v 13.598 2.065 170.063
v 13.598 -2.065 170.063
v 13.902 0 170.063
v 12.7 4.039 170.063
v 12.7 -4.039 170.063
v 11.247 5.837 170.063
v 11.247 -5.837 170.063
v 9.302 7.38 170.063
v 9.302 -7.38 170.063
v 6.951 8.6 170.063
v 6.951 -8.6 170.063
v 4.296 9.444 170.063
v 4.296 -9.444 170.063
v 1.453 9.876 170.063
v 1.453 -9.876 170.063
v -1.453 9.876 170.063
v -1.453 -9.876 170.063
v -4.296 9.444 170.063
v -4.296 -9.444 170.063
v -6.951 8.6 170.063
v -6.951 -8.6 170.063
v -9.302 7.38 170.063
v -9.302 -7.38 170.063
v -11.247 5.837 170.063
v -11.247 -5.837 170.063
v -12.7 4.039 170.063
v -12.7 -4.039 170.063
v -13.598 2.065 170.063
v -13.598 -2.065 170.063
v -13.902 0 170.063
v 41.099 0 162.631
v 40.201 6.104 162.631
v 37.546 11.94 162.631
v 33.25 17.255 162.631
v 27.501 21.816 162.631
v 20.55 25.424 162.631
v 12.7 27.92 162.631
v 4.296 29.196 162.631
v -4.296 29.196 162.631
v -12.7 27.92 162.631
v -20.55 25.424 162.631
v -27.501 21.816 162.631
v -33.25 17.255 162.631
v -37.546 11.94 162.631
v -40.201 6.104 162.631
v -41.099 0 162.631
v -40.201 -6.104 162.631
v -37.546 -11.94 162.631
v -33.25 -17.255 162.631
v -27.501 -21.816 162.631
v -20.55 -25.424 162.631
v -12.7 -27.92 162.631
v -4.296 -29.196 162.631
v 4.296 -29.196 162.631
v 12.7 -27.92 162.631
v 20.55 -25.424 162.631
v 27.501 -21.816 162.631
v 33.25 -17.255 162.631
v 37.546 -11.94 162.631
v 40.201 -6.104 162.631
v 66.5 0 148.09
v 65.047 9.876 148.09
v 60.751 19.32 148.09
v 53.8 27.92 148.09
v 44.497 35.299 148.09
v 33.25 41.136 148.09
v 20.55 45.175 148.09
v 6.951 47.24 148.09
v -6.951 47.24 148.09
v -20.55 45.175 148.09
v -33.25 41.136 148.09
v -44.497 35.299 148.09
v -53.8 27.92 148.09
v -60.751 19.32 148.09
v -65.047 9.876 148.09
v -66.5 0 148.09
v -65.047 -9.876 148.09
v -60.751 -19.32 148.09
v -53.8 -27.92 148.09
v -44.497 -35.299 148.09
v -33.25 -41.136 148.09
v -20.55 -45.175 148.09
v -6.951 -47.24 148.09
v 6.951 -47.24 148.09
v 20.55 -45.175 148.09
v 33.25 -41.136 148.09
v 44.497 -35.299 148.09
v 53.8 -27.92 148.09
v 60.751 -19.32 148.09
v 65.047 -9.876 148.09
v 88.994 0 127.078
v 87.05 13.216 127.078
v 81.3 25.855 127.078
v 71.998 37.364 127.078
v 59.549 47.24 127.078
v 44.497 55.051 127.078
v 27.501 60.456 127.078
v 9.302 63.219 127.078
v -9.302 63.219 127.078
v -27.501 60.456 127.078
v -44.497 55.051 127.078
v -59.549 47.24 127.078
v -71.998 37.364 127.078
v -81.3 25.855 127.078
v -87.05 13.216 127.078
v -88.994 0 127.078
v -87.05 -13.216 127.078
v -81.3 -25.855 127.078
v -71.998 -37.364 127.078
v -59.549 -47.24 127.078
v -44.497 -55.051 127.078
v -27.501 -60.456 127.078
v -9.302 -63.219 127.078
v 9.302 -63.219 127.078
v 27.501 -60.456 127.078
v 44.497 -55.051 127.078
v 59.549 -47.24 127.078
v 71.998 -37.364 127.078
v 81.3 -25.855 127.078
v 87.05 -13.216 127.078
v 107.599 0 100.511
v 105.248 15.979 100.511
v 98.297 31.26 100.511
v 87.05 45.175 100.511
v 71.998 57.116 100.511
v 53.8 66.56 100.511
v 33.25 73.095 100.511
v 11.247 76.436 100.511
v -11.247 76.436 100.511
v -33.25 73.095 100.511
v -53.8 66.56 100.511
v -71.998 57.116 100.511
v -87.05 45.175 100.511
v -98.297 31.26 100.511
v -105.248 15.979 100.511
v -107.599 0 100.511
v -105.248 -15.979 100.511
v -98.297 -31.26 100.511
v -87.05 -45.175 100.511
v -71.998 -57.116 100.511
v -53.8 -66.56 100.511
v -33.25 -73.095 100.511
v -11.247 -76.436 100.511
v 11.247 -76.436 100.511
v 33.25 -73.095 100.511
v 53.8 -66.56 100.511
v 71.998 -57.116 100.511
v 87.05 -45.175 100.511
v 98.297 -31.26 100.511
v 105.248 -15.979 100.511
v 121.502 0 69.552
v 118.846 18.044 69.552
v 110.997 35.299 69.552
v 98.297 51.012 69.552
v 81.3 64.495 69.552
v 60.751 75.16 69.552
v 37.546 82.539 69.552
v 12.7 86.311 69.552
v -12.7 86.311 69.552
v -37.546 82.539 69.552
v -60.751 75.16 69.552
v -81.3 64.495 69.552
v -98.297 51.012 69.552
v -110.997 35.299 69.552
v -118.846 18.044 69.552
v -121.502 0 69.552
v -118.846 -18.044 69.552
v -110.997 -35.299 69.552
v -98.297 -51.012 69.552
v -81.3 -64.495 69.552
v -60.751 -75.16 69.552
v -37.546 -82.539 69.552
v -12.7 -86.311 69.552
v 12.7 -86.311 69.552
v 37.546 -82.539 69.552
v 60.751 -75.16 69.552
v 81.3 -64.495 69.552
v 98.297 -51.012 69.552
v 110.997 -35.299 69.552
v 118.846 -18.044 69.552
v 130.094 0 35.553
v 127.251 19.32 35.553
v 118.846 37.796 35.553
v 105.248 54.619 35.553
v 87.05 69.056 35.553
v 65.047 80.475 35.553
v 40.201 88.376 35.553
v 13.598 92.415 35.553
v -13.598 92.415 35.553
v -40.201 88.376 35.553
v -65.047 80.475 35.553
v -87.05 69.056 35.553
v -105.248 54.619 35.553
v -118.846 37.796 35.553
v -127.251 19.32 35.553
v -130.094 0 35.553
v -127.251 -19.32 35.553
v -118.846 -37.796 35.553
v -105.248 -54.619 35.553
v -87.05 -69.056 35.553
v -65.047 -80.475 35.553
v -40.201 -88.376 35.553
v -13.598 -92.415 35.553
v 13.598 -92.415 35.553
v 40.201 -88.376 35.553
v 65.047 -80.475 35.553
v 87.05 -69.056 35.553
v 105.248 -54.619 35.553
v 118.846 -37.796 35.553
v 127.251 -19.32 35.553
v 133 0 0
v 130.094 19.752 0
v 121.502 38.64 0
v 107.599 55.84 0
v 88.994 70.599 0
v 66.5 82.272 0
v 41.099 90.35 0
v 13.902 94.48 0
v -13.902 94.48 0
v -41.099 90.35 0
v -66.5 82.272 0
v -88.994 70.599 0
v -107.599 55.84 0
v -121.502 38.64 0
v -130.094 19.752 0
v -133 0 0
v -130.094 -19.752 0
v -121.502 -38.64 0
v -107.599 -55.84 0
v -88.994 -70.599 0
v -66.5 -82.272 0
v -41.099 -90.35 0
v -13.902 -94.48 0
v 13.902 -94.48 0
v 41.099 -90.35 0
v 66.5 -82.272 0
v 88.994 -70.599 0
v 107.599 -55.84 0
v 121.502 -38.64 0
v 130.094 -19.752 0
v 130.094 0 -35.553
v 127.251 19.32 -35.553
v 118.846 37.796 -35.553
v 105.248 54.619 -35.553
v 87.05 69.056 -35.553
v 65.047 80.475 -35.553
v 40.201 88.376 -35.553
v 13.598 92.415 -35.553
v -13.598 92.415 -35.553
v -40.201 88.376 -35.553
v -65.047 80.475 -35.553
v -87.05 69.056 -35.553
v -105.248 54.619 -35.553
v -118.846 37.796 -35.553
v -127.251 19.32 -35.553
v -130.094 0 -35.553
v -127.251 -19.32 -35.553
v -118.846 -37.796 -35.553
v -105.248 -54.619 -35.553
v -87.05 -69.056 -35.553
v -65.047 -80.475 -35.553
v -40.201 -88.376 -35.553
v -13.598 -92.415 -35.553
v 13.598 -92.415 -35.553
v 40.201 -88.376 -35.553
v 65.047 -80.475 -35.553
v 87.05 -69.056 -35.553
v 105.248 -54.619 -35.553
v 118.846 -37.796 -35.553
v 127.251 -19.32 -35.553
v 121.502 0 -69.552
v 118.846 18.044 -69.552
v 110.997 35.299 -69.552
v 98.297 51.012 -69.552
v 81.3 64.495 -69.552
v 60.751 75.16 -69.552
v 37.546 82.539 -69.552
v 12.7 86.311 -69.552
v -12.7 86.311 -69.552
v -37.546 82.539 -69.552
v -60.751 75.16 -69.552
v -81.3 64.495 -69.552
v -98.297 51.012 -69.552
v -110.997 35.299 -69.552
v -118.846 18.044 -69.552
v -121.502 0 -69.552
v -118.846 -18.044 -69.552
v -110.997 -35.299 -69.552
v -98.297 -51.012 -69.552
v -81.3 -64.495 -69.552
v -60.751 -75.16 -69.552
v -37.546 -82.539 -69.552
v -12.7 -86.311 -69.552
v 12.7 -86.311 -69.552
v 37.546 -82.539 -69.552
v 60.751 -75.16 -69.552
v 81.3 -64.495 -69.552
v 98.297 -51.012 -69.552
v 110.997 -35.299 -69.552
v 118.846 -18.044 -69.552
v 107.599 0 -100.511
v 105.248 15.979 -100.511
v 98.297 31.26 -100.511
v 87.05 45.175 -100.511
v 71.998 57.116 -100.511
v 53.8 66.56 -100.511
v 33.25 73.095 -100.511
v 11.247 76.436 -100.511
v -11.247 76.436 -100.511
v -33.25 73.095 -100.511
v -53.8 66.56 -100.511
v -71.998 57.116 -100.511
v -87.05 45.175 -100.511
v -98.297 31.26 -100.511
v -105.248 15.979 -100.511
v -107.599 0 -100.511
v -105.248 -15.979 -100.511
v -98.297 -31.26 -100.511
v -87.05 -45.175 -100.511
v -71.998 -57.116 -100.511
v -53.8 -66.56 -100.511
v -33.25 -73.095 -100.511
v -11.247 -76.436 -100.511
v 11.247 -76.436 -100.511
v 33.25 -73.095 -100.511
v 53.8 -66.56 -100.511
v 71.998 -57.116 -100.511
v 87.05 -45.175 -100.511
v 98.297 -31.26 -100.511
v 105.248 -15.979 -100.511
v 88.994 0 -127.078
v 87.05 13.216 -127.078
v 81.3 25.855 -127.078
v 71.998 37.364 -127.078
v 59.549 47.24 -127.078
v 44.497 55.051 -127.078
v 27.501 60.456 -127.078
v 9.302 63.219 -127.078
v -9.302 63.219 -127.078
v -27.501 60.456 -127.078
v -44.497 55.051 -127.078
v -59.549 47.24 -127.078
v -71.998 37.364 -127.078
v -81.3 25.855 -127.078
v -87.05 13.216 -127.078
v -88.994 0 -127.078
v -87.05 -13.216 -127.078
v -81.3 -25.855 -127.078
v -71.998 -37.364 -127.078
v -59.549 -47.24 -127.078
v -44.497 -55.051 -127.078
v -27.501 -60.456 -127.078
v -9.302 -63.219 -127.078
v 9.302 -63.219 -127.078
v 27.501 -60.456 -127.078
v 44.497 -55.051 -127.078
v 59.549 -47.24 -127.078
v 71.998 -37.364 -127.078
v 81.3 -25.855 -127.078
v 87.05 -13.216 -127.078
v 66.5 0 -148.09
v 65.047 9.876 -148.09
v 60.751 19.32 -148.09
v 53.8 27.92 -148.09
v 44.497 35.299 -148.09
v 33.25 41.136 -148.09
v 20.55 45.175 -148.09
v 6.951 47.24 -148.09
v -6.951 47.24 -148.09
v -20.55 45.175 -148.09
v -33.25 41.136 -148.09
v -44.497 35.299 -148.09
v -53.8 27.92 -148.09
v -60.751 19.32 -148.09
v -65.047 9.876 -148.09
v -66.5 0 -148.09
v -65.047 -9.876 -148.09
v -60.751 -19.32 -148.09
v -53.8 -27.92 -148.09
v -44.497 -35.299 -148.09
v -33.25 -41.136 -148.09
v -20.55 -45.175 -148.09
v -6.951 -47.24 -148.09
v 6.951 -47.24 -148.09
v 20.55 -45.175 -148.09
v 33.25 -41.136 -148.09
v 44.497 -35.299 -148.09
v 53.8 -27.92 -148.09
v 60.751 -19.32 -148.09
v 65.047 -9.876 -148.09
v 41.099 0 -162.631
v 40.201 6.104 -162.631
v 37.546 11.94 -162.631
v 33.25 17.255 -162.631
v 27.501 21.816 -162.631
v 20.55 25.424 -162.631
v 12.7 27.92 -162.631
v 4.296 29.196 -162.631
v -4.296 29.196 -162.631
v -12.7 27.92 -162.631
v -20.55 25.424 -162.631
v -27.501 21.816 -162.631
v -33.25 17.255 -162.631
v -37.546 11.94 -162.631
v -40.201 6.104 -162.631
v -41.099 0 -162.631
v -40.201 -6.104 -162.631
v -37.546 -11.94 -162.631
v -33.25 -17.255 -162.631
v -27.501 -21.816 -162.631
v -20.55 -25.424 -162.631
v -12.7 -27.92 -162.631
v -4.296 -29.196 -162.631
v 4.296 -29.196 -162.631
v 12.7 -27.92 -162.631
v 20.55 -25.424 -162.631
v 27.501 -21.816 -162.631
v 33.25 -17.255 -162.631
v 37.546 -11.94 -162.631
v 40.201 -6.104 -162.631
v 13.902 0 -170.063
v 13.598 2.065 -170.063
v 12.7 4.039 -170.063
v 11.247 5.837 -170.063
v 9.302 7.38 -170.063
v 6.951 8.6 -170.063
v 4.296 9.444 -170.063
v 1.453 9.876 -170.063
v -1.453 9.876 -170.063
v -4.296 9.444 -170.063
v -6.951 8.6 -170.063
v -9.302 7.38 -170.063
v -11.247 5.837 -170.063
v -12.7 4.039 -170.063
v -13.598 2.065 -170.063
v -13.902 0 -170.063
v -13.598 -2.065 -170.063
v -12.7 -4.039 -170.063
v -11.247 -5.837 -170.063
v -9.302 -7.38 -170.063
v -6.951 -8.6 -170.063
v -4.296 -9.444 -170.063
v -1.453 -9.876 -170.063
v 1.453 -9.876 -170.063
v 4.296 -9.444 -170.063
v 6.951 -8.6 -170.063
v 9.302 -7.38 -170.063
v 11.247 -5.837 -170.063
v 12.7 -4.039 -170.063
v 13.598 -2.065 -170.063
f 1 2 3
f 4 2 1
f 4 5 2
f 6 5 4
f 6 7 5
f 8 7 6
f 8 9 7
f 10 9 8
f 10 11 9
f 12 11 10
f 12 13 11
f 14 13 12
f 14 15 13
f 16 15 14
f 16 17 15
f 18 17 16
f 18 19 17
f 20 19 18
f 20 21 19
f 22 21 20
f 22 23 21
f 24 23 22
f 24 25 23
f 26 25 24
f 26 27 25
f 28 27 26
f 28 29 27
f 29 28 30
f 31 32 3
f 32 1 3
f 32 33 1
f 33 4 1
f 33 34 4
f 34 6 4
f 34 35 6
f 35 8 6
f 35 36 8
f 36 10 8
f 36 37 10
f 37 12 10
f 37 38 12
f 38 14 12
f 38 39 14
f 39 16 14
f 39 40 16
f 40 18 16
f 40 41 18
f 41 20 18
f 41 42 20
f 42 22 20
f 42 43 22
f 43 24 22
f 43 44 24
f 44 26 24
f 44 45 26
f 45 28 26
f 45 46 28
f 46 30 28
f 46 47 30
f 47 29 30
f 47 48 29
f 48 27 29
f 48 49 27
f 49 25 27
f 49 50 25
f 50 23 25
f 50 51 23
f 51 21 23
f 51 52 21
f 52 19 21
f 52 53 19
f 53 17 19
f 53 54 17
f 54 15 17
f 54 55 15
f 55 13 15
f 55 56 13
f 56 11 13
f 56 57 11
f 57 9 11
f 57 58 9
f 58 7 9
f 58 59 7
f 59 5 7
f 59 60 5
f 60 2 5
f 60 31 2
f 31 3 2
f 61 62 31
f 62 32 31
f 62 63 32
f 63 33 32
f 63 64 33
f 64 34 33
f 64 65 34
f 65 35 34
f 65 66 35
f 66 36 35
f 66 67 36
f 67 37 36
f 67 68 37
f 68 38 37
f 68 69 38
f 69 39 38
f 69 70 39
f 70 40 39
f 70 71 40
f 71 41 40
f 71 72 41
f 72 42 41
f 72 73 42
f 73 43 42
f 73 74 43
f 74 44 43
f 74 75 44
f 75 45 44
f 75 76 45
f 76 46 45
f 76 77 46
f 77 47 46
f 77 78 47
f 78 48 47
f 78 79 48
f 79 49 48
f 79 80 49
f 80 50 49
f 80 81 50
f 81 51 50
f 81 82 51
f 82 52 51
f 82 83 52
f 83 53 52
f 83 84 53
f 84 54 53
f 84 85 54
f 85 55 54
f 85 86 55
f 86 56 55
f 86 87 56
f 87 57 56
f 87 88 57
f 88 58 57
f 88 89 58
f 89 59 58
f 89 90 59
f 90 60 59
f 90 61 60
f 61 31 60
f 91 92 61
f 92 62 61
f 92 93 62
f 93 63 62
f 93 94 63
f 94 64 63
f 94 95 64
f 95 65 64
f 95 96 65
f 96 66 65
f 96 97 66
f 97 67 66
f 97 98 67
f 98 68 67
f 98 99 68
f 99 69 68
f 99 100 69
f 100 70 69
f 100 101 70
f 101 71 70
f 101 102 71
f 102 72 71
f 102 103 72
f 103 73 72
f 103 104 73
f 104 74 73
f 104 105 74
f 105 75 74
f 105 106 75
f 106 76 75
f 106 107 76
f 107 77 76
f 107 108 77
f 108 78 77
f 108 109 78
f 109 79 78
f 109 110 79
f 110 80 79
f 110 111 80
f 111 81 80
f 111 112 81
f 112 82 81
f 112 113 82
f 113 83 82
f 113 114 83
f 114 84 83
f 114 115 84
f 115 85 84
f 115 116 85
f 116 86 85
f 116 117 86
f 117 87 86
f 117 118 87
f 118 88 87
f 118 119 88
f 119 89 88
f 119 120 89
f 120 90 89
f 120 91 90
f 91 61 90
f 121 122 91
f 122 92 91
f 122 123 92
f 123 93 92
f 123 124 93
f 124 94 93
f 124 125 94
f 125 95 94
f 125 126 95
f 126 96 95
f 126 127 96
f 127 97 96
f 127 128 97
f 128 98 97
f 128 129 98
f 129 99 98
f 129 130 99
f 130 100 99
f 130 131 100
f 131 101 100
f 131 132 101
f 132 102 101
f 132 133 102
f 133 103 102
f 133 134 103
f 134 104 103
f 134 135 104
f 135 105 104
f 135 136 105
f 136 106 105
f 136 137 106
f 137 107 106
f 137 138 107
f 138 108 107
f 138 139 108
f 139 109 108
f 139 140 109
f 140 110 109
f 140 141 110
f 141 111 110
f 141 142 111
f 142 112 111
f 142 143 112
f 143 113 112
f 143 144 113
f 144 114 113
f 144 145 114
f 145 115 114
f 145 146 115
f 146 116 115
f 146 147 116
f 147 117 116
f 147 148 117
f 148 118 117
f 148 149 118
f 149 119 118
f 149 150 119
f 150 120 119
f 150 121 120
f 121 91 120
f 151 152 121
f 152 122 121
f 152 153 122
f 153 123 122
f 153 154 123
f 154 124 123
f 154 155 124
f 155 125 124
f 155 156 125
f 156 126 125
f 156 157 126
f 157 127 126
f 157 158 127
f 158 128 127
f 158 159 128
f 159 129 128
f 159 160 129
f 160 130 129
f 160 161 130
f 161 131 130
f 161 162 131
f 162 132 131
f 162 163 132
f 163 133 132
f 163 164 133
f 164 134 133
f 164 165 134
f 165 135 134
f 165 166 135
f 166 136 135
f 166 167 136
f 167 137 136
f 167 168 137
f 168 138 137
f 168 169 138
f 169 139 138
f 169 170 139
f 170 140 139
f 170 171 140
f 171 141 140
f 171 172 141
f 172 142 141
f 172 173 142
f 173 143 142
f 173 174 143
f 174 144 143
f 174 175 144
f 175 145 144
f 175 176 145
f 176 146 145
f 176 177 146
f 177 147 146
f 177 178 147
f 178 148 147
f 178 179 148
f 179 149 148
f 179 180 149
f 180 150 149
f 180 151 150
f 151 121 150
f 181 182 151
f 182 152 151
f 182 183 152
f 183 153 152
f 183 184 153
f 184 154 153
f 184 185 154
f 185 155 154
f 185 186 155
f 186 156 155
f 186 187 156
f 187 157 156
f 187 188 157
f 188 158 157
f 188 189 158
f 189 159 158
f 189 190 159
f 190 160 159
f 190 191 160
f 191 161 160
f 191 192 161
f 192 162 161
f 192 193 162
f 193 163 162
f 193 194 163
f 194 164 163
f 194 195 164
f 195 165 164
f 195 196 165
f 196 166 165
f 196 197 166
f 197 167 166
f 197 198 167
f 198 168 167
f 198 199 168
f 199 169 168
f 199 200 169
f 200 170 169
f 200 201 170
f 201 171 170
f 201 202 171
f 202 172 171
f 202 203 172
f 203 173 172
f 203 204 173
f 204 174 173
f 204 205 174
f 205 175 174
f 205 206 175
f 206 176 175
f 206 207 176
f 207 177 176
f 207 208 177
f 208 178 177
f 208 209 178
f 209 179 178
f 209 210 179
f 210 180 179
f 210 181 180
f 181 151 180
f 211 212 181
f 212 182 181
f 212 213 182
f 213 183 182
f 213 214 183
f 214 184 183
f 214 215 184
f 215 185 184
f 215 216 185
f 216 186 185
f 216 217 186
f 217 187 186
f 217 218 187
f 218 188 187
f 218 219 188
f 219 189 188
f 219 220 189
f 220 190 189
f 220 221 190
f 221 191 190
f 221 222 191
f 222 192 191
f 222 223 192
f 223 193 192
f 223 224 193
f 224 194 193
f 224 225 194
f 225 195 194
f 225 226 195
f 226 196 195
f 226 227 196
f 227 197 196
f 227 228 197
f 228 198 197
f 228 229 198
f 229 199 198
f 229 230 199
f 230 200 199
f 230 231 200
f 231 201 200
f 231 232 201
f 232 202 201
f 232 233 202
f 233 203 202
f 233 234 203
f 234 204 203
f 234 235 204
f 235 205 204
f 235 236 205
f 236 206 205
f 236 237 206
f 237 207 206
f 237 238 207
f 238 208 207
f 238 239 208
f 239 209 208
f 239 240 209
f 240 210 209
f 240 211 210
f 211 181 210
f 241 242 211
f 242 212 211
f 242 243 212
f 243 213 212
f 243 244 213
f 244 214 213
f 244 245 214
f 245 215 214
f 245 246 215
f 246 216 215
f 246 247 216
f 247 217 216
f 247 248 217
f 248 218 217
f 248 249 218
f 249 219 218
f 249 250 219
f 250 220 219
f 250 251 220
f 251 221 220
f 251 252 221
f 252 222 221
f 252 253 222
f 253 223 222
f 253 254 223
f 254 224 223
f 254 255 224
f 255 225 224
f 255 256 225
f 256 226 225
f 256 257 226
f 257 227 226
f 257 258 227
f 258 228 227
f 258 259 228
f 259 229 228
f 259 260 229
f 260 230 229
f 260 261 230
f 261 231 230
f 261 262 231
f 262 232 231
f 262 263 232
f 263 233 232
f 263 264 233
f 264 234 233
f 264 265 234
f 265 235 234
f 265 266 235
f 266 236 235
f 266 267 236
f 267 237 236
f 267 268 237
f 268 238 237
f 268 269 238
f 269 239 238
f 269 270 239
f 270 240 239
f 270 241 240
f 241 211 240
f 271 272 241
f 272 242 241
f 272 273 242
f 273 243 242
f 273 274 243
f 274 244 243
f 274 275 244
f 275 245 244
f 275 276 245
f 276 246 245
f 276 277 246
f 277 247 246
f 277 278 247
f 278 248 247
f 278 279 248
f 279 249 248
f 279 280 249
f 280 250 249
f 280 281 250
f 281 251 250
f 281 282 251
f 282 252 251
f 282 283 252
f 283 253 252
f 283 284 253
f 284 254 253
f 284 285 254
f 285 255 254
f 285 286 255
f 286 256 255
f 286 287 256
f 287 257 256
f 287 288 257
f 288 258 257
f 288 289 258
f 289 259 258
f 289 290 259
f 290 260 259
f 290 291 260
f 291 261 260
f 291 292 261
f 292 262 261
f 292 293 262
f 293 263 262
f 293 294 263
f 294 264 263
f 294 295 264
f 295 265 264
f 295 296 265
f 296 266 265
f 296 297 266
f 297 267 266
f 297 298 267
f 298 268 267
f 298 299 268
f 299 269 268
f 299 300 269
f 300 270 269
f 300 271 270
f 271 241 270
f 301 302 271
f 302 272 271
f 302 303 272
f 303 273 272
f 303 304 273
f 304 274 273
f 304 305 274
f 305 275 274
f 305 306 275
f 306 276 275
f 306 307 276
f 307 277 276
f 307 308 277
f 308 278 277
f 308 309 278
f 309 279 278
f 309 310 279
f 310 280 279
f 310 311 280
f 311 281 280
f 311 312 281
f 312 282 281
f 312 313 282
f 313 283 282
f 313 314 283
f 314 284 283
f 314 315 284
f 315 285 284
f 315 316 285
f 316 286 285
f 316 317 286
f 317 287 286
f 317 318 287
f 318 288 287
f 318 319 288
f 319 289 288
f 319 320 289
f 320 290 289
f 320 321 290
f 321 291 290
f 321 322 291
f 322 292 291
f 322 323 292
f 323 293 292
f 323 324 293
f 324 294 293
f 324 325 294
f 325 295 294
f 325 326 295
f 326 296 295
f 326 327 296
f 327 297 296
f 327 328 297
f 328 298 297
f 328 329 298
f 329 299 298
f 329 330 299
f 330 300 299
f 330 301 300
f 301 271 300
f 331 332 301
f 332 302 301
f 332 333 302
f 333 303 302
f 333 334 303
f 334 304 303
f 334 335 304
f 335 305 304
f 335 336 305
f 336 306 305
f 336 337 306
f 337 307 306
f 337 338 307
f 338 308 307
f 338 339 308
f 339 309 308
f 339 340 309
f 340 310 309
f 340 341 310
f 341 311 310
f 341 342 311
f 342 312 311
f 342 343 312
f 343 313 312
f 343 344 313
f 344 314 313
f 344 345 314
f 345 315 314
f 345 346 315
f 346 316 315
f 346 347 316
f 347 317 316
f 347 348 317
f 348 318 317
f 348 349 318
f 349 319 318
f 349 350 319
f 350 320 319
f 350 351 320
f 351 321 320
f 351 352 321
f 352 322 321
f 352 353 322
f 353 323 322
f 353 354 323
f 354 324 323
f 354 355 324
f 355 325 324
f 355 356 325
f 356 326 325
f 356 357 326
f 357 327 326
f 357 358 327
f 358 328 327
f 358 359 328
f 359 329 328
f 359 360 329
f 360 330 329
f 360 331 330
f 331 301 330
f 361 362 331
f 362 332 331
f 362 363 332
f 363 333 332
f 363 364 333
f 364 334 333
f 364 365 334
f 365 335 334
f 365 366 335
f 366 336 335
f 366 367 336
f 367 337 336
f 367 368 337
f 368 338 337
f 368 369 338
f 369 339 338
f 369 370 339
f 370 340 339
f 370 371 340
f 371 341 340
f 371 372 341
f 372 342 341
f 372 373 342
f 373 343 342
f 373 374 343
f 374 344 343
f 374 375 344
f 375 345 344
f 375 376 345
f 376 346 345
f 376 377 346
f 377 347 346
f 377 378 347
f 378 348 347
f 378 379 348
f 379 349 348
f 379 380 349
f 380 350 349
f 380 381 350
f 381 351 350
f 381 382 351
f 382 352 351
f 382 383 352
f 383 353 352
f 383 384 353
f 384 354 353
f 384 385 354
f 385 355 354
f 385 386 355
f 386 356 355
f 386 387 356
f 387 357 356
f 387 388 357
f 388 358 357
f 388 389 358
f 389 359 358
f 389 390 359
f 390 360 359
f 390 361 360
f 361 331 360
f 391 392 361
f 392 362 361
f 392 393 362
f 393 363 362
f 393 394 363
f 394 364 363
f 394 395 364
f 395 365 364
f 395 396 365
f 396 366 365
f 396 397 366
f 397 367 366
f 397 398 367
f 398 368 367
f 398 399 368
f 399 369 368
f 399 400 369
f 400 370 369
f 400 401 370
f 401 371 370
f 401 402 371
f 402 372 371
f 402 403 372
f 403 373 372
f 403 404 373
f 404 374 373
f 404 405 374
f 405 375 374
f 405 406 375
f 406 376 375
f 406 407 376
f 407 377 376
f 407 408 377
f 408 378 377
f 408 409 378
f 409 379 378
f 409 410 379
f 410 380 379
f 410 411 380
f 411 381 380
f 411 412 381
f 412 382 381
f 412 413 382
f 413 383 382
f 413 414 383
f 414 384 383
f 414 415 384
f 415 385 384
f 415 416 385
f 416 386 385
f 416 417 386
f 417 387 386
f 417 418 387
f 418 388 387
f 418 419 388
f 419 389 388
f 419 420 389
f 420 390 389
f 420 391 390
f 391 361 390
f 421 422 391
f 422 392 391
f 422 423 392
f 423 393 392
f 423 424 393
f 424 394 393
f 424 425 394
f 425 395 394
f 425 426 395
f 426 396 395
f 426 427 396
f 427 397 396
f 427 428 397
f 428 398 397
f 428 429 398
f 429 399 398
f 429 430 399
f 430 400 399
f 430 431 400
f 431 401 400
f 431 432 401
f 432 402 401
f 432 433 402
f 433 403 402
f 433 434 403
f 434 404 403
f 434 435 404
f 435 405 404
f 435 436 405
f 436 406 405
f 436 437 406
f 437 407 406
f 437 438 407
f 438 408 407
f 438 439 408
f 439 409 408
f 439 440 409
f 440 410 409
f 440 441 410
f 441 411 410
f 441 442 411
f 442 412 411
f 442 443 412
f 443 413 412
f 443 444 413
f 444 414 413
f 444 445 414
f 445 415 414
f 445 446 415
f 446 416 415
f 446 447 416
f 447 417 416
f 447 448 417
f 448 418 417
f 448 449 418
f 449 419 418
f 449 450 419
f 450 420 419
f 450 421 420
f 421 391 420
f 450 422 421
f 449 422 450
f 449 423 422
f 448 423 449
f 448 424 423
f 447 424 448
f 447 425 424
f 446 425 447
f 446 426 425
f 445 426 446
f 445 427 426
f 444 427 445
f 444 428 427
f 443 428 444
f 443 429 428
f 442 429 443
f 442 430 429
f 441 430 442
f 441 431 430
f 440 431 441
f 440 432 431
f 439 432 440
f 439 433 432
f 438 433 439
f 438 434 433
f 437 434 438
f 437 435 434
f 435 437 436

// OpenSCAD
// Generated by SolidPython 1.0.1 on 2020-07-29 00:46:47


scale(v = [7, 5, 9]) {
	sphere(r = 19);
}
/***********************************************
*********      SolidPython code:      **********
************************************************
 
# import packages: SolidPython
from solid import *
from solid.utils import *
from itertools import chain, combinations, permutations


class Resize:

    def __init__(self, scad_file):
        self.scad_file = scad_file
        #self.scad_file = import_scad(scad_file)
        # cone/cylinder param:
        self.r1 = 0
        self.r2 = 0
        self.h = 0
        # rectangular prism param:
        self.w = 0
        self.l = 0
        # ellipse param:
        self.r = 0

    # import OpenScad code (file name corresponds to shape)


    # classify shape + parameters
    def assign(self, param1, param2, param3):
        if self.scad_file == 'cone.scad':
            self.r1 = param1
            self.r2 = param2
            self.h = param3
        elif self.scad_file == 'cylinder.scad':
            self.r1 = param1
            self.r2 = param2
            self.h = param3
        elif self.scad_file == 'rectangularPrism.scad':
            self.h = param1
            self.l = param2
            self.w = param3
        else:
            self.r = param1
            self.h = param2

    # resize parameters
    def iterate(self):
        x = range(3, 20, 2)
        i = 1
        if self.scad_file == 'cone.scad':
            tempList = list(permutations(x, 2))
            for temp in tempList:
                param1 = temp[0]
                param2 = temp[1]
                filepath = 'produced_scad_files/' + 'cone' + str(param1) + '_' + str(param2) + '_' + '.scad'
                scad_render_to_file(cylinder(h=param1, r1=param2, r2=0), filepath)

        elif self.scad_file == 'cylinder.scad':
            tempList = list(permutations(x, 3))
            for temp in tempList:
                param1 = temp[0]
                param2 = temp[1]
                filepath = 'produced_scad_files/' + 'cylinder' + str(param1) + '_' + str(param2) + '_' + '.scad'
                scad_render_to_file(cylinder(h=param1, r1=param2, r2=param2), filepath)

        elif self.scad_file == 'rectangularPrism.scad':
            tempList = list(permutations(x, 3))
            for temp in tempList:
                param1 = temp[0]
                param2 = temp[1]
                param3 = temp[2]
                filepath = 'produced_scad_files/' + 'rectangularPrism' + str(param1) + '_' + str(param2) + '_' + str(
                    param3) + '.scad'
                scad_render_to_file(cube(size=(param1, param2, param3)), filepath)

        elif self.scad_file == 'ellipse.scad':
            tempList = list(permutations(x, 4))
            for temp in tempList:
                param1 = temp[0]
                param2 = temp[1]
                param3 = temp[2]
                param4 = temp[3]
                filepath = 'produced_scad_files/' + 'ellipse' + str(param1) + '_' + str(param2) + '_' + str(param3) + '_' + str(param4) + '.scad'
                scad_render_to_file(scale([param1, param2, param3])(sphere(r=param4)), filepath)

    def render_to_scadfile(self):
        scad_render_to_file(scad, 'example.scad') 
 
************************************************/
